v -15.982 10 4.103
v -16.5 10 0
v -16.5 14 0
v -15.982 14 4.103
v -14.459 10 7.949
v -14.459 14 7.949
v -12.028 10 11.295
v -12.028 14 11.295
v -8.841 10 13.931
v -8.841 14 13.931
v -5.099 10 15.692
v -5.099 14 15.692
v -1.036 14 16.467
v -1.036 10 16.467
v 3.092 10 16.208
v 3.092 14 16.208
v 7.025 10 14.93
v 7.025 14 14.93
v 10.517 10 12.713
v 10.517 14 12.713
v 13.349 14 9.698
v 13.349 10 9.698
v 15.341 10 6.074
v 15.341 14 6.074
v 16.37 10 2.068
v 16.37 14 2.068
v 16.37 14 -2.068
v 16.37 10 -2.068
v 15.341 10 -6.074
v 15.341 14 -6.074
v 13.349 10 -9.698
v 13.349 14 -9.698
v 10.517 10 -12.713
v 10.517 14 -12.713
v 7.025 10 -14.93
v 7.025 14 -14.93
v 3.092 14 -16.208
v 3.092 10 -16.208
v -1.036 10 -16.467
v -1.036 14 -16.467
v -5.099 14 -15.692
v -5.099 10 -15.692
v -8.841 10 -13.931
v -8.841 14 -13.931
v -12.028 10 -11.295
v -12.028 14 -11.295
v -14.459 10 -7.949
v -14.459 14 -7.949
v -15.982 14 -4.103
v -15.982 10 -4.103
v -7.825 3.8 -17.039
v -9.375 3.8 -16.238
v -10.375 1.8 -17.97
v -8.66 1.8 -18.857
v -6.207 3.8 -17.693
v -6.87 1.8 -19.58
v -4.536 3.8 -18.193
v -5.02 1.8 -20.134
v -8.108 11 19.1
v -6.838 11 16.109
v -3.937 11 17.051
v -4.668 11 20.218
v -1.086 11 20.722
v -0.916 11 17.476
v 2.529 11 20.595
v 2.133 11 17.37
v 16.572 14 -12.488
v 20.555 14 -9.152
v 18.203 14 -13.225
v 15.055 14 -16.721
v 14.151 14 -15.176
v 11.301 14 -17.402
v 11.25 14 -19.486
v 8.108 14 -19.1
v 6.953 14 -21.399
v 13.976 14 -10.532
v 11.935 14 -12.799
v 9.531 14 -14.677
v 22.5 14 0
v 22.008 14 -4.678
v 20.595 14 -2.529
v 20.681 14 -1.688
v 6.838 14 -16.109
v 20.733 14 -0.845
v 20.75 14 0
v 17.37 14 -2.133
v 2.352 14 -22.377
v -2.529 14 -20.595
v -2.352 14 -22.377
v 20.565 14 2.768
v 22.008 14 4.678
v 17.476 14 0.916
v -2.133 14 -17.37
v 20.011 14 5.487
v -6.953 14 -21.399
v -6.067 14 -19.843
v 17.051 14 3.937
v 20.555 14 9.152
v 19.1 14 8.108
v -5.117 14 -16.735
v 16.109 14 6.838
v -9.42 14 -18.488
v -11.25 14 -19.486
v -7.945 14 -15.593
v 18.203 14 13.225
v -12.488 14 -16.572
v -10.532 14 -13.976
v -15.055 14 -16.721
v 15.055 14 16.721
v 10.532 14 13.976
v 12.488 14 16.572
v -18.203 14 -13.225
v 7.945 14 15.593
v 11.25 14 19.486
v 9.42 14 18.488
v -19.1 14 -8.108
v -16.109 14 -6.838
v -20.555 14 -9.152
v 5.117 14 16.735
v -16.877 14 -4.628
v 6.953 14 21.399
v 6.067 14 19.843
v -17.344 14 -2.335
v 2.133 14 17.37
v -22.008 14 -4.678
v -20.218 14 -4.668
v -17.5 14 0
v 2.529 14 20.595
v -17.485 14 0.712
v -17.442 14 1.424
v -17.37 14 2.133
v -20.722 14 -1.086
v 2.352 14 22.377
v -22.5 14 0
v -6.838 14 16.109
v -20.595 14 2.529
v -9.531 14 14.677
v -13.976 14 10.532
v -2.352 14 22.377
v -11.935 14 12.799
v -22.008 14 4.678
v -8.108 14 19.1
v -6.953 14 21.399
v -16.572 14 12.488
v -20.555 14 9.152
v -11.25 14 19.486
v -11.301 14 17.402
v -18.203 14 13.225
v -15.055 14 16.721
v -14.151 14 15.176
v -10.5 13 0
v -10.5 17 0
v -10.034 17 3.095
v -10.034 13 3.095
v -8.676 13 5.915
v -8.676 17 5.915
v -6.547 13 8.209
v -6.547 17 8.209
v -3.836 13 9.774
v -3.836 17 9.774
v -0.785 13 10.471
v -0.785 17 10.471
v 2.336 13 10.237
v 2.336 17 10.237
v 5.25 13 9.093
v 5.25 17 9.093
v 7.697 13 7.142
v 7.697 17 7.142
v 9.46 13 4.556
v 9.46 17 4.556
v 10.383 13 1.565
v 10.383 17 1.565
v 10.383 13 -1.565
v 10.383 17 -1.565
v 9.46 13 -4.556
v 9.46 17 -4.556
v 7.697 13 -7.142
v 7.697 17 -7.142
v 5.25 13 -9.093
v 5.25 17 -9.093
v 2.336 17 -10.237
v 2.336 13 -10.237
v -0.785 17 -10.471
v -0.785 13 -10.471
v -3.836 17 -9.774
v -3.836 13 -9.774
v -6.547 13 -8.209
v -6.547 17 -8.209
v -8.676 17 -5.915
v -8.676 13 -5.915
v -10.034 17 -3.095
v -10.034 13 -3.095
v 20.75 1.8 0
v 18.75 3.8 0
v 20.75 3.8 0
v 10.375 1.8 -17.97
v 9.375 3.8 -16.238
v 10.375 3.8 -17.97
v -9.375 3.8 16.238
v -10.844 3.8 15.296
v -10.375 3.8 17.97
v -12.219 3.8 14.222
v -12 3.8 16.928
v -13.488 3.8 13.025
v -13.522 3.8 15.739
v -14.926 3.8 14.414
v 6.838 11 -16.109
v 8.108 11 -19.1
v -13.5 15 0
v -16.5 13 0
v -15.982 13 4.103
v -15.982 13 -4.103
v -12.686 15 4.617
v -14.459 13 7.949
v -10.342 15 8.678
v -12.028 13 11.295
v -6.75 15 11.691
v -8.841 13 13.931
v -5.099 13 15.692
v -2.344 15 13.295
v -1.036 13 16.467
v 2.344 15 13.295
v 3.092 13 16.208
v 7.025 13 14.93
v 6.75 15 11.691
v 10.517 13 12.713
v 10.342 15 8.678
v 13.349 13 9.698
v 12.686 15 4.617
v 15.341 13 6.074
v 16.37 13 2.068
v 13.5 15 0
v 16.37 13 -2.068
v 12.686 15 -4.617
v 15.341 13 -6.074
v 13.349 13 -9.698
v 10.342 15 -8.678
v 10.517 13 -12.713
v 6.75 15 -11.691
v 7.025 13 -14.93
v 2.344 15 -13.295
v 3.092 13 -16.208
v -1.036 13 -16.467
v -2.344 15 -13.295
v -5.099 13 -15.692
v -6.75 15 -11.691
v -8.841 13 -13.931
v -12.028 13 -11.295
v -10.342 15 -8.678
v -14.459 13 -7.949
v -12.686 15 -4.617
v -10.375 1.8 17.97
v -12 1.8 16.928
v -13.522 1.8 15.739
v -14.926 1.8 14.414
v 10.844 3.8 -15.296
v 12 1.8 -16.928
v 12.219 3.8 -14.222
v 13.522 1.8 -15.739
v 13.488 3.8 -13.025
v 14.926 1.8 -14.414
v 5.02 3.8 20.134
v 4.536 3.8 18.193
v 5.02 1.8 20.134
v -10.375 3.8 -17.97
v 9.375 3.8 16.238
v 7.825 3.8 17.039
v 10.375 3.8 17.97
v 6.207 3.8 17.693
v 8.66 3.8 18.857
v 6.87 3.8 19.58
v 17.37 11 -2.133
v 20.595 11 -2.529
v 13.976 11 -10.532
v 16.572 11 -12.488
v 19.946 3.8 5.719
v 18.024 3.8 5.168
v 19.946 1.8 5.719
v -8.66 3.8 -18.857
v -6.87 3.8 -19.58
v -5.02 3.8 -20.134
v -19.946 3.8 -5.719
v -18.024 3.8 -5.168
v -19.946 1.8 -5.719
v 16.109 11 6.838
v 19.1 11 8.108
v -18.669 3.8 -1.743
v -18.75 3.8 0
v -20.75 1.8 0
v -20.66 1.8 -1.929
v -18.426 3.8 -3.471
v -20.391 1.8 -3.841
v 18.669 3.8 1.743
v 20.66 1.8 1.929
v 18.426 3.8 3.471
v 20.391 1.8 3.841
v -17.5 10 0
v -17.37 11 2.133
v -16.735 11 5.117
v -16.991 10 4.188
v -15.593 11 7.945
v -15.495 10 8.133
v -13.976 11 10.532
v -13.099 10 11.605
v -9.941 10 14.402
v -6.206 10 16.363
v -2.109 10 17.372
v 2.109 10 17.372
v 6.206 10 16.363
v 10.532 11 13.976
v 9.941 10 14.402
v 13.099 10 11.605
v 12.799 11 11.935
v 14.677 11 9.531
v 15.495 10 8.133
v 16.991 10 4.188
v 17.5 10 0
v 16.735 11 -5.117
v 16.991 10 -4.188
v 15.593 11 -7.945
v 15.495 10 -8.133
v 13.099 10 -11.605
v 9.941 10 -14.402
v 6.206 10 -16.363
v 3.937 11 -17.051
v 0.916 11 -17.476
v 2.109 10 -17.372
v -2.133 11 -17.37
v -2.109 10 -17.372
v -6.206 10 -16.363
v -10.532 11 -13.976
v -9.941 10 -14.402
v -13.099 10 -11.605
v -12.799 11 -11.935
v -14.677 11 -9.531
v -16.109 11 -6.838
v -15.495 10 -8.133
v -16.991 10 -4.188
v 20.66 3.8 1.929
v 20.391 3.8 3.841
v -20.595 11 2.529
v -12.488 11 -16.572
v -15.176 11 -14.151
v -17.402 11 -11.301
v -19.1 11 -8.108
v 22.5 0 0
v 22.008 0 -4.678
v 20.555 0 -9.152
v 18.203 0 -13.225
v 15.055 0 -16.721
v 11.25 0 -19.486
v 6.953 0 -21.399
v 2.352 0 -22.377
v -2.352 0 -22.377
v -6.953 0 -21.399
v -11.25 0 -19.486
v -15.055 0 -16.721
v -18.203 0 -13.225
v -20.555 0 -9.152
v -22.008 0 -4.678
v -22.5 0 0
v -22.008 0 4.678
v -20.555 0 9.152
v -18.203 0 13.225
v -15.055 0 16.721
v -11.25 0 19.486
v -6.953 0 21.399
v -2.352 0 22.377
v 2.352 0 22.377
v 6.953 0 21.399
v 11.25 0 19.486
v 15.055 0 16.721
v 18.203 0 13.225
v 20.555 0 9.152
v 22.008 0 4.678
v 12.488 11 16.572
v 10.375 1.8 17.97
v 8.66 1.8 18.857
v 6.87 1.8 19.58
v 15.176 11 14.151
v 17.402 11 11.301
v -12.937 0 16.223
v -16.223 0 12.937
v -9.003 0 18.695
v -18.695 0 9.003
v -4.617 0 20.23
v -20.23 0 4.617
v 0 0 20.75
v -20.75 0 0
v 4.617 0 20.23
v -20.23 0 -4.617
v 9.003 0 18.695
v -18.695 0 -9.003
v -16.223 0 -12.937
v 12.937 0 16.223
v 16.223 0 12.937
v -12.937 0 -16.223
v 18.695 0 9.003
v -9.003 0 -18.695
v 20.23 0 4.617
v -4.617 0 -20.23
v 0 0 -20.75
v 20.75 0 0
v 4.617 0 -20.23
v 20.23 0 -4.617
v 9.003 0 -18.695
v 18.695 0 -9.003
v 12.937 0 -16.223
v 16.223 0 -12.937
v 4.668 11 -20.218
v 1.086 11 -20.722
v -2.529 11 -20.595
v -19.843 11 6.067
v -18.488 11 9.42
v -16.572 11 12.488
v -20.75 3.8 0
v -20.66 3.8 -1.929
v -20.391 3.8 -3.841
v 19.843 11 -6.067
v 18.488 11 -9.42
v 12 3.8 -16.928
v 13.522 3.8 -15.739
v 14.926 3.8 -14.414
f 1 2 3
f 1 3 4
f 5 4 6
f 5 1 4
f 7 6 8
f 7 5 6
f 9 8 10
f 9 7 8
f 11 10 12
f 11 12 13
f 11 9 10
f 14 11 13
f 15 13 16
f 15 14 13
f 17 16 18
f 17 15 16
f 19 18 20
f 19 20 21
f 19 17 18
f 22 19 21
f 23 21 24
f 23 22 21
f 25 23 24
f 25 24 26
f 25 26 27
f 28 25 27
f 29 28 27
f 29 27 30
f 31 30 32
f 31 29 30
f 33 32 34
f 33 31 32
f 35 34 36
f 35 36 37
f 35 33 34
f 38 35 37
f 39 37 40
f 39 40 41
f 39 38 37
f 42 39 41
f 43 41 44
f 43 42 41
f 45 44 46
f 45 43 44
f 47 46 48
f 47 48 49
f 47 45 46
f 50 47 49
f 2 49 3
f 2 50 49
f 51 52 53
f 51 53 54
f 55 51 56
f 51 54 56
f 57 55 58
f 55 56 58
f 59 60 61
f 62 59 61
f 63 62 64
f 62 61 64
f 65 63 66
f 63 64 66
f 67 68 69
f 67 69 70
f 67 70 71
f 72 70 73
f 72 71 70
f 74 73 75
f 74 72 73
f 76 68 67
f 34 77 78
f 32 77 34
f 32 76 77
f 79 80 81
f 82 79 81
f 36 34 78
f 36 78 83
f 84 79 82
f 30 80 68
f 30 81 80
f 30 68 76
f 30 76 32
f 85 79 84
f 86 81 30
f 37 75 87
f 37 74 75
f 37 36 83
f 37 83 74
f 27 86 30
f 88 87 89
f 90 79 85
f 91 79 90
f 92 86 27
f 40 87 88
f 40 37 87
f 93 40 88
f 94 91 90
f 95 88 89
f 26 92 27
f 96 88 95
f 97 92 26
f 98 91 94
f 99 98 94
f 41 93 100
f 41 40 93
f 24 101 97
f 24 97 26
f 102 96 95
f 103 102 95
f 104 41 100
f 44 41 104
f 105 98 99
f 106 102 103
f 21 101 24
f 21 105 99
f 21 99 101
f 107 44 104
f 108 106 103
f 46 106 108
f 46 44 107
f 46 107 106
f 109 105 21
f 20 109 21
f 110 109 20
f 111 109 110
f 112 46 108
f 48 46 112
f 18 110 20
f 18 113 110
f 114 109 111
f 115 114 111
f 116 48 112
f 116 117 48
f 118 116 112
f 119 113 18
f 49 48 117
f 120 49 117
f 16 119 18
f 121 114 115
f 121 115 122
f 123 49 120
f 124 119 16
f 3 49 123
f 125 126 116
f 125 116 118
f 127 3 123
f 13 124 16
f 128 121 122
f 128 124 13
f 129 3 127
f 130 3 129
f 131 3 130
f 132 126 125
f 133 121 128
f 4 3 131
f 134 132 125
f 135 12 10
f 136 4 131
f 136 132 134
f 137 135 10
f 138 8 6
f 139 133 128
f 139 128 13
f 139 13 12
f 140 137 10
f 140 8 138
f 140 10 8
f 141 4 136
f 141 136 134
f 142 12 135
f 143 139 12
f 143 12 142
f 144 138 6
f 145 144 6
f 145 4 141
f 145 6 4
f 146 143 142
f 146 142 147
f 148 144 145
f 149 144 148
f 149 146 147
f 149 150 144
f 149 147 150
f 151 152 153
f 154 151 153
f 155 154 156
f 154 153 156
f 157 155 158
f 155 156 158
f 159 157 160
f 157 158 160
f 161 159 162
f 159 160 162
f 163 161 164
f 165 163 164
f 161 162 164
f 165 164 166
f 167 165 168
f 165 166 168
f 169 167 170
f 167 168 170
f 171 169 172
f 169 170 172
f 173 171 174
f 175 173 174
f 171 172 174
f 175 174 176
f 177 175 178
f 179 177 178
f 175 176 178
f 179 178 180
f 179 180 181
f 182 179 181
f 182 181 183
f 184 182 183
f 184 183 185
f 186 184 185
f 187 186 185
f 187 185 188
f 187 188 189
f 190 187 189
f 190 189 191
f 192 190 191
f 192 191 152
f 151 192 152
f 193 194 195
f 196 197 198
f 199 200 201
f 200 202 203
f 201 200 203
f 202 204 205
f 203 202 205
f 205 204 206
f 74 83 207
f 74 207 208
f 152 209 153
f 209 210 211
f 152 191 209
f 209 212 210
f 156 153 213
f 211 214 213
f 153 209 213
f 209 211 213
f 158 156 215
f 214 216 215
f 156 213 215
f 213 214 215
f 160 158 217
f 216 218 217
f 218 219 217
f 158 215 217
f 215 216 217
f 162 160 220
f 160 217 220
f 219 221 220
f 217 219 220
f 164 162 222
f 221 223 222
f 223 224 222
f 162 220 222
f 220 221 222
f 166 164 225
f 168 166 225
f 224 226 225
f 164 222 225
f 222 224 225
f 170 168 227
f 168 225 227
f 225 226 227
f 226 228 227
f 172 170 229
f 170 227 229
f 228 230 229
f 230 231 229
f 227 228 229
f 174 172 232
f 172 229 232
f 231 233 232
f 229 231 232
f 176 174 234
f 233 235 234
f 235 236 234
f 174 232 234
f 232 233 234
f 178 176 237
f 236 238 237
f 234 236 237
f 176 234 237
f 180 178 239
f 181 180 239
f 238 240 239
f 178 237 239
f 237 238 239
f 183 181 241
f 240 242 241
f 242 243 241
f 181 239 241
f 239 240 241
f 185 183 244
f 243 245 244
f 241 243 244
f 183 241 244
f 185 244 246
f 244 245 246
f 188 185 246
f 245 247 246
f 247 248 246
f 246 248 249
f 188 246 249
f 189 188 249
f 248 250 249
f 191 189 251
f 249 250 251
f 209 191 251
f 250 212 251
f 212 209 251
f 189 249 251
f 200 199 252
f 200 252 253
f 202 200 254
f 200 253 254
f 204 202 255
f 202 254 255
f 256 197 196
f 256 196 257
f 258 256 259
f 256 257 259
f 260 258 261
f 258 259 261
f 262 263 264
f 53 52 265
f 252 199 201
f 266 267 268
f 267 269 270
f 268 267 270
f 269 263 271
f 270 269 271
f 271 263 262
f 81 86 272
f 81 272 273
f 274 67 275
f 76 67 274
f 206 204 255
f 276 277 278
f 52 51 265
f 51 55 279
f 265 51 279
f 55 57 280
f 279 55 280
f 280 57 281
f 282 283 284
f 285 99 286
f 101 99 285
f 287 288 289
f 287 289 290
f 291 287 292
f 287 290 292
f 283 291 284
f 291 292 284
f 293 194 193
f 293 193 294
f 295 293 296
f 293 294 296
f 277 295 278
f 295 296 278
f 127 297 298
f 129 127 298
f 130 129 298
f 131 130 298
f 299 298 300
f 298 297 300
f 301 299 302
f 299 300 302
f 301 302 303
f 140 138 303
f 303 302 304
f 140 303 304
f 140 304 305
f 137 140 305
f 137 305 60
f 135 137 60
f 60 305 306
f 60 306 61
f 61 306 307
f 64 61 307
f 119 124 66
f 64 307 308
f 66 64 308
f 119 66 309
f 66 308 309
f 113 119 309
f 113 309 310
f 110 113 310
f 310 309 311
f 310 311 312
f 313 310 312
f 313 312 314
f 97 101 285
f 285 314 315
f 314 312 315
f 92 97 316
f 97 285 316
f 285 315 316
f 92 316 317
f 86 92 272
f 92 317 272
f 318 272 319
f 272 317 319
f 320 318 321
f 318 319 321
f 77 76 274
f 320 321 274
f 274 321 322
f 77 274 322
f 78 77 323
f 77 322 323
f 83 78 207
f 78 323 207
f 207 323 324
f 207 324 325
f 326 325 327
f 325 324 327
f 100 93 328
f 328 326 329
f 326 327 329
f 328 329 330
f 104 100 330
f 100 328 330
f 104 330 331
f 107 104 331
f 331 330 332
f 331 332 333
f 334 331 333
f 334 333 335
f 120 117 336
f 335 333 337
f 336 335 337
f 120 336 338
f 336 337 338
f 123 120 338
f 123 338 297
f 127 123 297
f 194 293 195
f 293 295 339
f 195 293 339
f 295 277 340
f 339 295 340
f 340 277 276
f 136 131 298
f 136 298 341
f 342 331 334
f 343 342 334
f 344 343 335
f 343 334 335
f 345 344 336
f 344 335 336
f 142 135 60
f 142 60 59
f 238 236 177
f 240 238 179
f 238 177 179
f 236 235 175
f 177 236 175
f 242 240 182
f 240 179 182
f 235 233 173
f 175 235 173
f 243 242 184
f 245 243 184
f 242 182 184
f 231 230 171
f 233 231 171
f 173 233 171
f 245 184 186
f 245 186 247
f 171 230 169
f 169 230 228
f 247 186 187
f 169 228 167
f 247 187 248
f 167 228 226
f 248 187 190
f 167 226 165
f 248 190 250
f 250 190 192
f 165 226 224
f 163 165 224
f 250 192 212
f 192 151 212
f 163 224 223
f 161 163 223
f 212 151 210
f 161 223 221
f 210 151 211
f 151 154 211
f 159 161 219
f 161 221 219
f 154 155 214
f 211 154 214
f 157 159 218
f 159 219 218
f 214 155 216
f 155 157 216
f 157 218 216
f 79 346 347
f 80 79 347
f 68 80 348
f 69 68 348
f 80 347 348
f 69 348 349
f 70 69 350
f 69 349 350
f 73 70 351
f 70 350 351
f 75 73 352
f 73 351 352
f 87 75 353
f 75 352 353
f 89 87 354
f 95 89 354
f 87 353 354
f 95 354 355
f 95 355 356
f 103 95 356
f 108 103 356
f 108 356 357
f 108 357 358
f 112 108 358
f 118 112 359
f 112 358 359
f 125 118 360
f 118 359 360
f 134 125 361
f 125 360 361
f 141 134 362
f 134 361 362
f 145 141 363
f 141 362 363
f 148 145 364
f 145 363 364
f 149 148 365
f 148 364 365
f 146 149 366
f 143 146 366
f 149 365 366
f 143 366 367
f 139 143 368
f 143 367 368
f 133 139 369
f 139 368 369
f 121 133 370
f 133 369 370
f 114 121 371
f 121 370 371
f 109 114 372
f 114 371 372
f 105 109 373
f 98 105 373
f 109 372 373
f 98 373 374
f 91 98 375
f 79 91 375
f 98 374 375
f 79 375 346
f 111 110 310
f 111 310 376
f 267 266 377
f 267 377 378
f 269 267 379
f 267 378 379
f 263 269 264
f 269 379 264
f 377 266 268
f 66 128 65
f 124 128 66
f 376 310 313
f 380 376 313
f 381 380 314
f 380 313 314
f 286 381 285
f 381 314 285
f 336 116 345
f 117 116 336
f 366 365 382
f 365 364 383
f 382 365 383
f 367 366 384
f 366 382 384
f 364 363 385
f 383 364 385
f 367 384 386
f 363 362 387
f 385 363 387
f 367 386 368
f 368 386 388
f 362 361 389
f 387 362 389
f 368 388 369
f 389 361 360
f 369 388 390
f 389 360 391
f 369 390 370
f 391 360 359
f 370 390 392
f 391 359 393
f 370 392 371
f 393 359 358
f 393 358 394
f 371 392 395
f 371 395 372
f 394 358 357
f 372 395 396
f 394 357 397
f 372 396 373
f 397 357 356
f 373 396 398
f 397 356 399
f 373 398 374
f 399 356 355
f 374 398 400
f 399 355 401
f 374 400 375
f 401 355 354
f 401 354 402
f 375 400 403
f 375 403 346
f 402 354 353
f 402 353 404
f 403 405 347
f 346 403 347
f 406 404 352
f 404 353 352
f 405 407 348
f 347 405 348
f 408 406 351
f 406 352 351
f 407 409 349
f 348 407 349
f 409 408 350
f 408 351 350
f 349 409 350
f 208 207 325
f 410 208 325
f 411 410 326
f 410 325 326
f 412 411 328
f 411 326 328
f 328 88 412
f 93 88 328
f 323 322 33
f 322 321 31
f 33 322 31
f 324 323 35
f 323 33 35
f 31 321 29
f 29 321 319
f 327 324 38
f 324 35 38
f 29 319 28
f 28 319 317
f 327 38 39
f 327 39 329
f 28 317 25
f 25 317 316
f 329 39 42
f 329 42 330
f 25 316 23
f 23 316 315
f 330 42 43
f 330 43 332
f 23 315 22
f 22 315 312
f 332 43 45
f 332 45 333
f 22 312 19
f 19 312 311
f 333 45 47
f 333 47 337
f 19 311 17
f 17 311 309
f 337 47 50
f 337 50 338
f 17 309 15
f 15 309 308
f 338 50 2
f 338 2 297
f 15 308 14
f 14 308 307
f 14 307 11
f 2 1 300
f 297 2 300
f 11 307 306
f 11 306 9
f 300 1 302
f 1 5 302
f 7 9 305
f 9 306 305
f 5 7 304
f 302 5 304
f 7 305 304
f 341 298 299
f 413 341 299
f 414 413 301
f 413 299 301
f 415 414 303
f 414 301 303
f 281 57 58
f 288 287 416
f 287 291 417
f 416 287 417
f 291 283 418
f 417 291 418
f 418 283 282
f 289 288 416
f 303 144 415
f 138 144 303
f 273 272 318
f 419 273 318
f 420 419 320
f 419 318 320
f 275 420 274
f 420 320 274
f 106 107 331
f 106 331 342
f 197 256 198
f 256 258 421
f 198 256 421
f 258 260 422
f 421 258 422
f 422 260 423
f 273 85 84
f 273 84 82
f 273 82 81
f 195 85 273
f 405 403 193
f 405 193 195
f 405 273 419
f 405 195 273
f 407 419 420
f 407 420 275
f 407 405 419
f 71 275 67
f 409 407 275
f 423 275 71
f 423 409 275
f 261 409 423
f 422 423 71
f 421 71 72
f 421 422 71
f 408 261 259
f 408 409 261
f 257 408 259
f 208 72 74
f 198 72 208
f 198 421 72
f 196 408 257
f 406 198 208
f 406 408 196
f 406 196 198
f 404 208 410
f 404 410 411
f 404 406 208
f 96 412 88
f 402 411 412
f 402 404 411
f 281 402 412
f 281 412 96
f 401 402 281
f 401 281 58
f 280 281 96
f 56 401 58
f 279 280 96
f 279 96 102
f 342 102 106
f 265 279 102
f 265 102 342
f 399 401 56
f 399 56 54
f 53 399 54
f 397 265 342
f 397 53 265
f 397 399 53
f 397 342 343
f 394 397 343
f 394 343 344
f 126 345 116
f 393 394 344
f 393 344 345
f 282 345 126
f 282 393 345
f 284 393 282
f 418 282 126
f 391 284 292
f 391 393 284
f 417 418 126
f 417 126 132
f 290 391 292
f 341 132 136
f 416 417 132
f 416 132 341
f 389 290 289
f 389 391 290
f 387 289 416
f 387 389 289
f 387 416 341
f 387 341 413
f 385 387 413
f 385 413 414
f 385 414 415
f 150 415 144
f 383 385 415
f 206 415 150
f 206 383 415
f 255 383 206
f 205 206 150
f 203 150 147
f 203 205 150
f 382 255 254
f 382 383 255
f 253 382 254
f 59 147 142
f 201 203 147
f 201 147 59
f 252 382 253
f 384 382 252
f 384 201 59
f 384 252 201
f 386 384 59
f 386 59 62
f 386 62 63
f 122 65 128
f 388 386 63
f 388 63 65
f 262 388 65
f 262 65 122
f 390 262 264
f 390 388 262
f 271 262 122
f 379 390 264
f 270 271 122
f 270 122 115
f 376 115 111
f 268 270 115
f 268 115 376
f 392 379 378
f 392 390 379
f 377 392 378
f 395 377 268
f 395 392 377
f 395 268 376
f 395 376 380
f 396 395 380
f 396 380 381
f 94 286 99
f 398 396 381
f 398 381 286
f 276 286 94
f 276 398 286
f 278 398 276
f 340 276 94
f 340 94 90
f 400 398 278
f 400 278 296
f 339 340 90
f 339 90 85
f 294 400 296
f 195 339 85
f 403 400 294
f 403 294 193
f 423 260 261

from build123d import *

# Parameters (mm, degrees)
SKETCH1_R          = 22.5
SKETCH1_R_2        = 20.75
EXTRUDE1_DEPTH     = 14
REVOLVE6_ANGLE     = 16
CIRPATTERN1_COUNT  = 6
SKETCH5_R          = 17.5
SKETCH5_R_2        = 16.5
EXTRUDE2_DEPTH     = 4
SKETCH7_R          = 10.5
SKETCH6_R          = 16.5
SKETCH8_R          = 10.5
CUT_EXTRUDE1_DEPTH = 18
EXTRUDE3_DEPTH     = 3
CIRPATTERN2_COUNT  = 6


with BuildPart() as part:
    # Sketch1 → Extrude1 (new body)
    with BuildSketch(Plane(origin=(0, 0, 0), x_dir=(1, 0, 0), z_dir=(0, 1, 0))):
        Circle(SKETCH1_R)
        Circle(SKETCH1_R_2, mode=Mode.SUBTRACT)
    extrude(amount=EXTRUDE1_DEPTH)

    # Sketch4 → Revolve6 (revolve)
    with BuildSketch(Plane.XY):
        Polygon((-20.75, 3.8), (-18.75, 3.8), (-20.75, 1.8), align=None)
    revolve6 = revolve(axis=Axis((0, 14, 0), (0, -1, 0)), revolution_arc=REVOLVE6_ANGLE)

    # CirPattern1: Revolve6 ×6 about axis
    cirpattern1_axis = Axis((0, 0, 0), (0, 1, 0))
    for i in range(1, CIRPATTERN1_COUNT):
        add(revolve6.rotate(cirpattern1_axis, i * 360 / CIRPATTERN1_COUNT))



with BuildPart() as body_2:
    # Sketch5 → Extrude2 (new body)
    with BuildSketch(Plane(origin=(0, 10, 0), x_dir=(-1, 0, 0), z_dir=(0, 1, 0))):
        Circle(SKETCH5_R)
        Circle(SKETCH5_R_2, mode=Mode.SUBTRACT)
    extrude(amount=EXTRUDE2_DEPTH)


with BuildPart() as body_3:
    # Sketch7 → Loft1 section 0
    with BuildSketch(Plane(origin=(0, 17, 0), x_dir=(-1, 0, 0), z_dir=(0, 1, 0))):
        Circle(SKETCH7_R)
    # Sketch6 → Loft1 section 1
    with BuildSketch(Plane(origin=(0, 13, 0), x_dir=(-1, 0, 0), z_dir=(0, 1, 0))):
        Circle(SKETCH6_R)
    loft()

    # Sketch8 → Cut-Extrude1 (cut, through all)
    with BuildSketch(Plane(origin=(0, 17, 0), x_dir=(-1, 0, 0), z_dir=(0, 1, 0))):
        Circle(SKETCH8_R)
    extrude(amount=-CUT_EXTRUDE1_DEPTH, mode=Mode.SUBTRACT)


with BuildPart() as part_1:
    add(part.part)

    add(body_2.part)  # Extrude3 merges body 2
    # Sketch9 → Extrude3 (add)
    with BuildSketch(Plane(origin=(0, 14, 0), x_dir=(-1, 0, 0), z_dir=(0, 1, 0))):
        with BuildLine():
            Line((2.528788876, -20.595332647), (2.13271351, -17.369557654))
            ThreePointArc((2.13271351, -17.369557654), (-2.435529267, -17.329691203), (-6.837794749, -16.108834935))
            Line((-6.837794749, -16.108834935), (-8.107670916, -19.100475709))
            ThreePointArc((-8.107670916, -19.100475709), (-2.887841845, -20.548062426), (2.528788876, -20.595332647))
        make_face()
    extrude3 = extrude(amount=-EXTRUDE3_DEPTH)

    # CirPattern2: Extrude3 ×6 about axis
    cirpattern2_axis = Axis((0, 0, 0), (0, 1, 0))
    for i in range(1, CIRPATTERN2_COUNT):
        add(extrude3.rotate(cirpattern2_axis, i * 360 / CIRPATTERN2_COUNT))


solid = Compound([body_3.part, part_1.part])
